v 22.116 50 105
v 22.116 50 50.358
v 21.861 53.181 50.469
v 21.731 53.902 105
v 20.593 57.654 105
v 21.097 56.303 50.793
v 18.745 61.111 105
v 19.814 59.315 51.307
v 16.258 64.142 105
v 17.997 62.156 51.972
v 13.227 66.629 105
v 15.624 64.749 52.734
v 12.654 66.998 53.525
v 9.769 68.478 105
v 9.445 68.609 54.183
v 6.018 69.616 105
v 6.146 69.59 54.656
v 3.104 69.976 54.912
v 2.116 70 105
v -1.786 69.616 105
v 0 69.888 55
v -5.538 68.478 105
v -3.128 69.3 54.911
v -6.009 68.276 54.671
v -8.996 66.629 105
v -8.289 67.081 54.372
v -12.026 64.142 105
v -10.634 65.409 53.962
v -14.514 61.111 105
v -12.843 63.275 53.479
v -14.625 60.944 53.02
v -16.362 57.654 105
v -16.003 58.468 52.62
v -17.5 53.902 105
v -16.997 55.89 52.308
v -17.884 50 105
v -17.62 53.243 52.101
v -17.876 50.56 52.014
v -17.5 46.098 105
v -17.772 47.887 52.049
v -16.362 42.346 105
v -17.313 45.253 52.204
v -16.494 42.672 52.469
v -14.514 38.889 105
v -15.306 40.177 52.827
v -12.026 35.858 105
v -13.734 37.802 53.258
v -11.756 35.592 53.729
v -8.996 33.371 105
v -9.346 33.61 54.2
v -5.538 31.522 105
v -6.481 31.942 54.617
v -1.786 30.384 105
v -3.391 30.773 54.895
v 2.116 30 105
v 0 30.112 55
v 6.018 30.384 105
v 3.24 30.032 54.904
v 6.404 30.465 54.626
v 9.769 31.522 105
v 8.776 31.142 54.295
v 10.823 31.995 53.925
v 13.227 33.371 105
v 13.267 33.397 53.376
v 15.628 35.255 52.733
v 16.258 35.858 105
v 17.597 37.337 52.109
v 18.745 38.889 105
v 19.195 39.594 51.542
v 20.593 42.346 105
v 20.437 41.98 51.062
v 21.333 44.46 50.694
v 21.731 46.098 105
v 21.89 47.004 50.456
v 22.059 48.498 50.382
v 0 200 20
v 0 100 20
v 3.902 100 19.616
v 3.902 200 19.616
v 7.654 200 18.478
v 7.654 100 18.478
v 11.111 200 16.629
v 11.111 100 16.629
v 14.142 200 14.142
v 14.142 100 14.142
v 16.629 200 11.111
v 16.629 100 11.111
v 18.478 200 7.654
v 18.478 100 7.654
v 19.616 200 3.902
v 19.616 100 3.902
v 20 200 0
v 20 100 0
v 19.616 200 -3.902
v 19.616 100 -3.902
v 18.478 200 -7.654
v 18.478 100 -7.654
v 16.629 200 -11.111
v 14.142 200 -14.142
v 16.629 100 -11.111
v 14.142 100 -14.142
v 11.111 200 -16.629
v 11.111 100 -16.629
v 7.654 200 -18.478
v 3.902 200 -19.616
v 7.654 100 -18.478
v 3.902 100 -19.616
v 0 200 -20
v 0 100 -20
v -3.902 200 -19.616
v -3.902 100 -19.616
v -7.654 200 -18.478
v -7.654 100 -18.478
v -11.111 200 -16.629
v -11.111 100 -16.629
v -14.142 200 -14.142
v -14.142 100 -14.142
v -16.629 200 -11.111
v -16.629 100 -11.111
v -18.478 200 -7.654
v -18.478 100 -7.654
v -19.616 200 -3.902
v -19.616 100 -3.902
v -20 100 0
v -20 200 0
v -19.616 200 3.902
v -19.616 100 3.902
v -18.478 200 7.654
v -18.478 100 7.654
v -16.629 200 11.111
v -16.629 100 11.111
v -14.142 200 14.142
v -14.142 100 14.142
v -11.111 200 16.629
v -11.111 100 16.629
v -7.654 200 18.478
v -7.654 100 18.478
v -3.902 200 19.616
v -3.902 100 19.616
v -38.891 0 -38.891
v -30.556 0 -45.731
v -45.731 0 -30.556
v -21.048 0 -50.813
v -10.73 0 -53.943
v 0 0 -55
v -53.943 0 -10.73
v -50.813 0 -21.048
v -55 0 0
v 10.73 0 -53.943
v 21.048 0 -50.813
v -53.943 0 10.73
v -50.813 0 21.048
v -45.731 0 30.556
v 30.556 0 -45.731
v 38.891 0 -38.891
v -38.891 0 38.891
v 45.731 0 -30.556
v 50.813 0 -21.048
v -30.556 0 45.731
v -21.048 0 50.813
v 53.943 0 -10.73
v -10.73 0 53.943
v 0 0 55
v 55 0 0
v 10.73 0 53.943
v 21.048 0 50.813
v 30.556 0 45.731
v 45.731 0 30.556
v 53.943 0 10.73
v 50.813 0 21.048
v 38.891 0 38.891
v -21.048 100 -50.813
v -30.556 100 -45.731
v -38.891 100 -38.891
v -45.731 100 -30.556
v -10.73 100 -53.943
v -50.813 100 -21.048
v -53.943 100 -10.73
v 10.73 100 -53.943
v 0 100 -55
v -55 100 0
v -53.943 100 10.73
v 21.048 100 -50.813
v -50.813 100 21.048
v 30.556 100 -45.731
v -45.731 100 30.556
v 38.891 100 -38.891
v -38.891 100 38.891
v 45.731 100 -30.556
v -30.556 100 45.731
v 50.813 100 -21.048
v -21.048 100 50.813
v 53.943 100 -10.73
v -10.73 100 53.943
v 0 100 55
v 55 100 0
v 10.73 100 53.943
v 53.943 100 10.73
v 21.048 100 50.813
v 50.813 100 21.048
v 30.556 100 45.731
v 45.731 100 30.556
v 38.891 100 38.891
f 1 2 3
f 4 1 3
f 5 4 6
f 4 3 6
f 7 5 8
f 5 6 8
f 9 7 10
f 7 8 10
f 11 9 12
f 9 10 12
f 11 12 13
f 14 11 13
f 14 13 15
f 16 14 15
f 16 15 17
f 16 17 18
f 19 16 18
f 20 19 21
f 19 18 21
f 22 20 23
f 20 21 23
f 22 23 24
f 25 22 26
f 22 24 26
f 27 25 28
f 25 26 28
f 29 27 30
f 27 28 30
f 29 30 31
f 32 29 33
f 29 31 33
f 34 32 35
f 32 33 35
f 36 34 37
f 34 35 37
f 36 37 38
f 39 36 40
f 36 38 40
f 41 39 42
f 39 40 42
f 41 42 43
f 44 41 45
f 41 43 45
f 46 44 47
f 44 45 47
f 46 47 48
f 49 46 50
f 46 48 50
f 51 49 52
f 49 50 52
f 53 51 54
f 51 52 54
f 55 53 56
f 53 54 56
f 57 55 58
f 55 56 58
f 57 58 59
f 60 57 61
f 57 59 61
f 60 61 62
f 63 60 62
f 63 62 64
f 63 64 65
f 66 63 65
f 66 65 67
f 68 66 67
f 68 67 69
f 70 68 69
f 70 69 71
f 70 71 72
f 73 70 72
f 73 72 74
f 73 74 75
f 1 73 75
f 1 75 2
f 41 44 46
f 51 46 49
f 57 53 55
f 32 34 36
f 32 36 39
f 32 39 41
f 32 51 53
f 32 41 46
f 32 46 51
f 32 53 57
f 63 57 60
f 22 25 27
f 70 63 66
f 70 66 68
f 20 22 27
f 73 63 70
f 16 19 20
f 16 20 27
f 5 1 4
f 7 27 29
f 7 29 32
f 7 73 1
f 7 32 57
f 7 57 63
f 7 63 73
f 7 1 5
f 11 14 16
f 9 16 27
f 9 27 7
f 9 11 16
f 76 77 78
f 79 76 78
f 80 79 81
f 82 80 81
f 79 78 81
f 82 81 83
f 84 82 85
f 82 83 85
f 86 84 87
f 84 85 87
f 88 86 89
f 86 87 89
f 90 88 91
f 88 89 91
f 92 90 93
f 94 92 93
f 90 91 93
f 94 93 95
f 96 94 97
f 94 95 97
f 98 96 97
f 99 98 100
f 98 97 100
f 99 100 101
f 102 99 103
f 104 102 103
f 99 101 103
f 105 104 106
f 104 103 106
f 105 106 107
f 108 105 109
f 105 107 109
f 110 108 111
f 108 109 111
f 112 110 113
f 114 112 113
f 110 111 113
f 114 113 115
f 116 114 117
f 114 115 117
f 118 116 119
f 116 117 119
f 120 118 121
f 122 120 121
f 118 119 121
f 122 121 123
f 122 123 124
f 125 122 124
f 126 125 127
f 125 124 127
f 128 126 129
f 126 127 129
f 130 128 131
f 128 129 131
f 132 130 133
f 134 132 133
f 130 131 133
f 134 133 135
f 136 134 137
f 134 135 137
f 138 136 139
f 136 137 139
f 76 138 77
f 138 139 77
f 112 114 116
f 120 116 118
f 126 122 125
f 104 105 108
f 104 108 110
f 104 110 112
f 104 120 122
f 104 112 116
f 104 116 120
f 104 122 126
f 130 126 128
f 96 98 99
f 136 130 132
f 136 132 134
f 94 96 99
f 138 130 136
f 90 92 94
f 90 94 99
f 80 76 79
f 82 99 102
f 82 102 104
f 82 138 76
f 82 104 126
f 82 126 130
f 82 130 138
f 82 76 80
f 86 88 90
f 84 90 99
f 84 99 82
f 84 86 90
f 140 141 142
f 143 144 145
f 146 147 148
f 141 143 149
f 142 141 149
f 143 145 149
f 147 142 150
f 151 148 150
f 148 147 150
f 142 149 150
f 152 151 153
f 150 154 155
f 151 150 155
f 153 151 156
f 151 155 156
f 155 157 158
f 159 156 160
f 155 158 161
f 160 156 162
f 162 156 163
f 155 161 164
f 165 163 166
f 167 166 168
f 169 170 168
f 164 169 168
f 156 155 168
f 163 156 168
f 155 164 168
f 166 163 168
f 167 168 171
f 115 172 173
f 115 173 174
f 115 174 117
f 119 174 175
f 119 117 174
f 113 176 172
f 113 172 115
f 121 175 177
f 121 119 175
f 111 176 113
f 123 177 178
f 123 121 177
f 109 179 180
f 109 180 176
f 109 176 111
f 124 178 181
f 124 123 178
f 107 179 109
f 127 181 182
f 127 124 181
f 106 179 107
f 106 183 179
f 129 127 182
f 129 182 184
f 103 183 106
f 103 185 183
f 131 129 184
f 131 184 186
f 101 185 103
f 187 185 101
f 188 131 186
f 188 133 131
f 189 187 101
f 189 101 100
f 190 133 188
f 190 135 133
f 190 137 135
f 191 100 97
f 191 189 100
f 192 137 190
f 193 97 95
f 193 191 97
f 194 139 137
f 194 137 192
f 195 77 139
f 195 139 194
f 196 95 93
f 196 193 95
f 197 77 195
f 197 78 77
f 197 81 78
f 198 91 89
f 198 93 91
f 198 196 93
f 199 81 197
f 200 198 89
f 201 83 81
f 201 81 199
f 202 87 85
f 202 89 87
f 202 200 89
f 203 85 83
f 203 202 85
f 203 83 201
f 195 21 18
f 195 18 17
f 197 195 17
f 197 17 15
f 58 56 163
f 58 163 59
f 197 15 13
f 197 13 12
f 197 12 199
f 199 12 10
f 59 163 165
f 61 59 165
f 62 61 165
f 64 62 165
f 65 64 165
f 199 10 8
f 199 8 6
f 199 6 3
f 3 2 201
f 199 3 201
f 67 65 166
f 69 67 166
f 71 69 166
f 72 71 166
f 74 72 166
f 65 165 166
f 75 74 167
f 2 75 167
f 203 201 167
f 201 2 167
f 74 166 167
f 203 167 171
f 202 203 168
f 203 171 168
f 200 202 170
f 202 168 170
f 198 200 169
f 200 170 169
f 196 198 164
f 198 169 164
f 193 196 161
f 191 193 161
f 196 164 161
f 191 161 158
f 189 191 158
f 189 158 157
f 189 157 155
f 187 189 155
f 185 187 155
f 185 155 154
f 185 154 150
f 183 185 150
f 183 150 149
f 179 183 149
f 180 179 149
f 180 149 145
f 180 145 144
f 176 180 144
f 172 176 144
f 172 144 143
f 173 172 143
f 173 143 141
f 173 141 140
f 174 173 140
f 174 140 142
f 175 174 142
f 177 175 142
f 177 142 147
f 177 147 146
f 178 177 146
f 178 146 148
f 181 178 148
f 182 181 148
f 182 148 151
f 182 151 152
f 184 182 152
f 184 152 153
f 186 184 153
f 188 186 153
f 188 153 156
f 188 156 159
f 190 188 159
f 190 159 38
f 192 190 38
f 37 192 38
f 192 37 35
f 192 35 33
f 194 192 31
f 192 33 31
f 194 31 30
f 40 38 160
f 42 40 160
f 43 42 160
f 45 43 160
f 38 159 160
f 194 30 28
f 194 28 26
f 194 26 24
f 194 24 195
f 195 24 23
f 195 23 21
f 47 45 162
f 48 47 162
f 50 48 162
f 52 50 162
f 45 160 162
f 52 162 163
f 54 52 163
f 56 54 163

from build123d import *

# Parameters (mm, degrees)
SKETCH1_R                = 55
BOSS_EXTRUDE1_DEPTH      = 100
SKETCH2_R                = 20
BOSS_EXTRUDE2_DEPTH      = 100
BOSS_EXTRUDE3_DEPTH      = 50
BOSS_EXTRUDE3_DEPTH_BACK = 20
SKETCH3_R                = 20


with BuildPart() as part:
    # Sketch1 → Boss-Extrude1 (new body)
    with BuildSketch(Plane(origin=(0, 0, 0), x_dir=(1, 0, 0), z_dir=(0, 1, 0))):
        with Locations(Location((0, 0, 0), (0, 0, 270))):
            Circle(SKETCH1_R)
    extrude(amount=BOSS_EXTRUDE1_DEPTH)

    # Sketch2 → Boss-Extrude2 (add)
    with BuildSketch(Plane(origin=(0, 100, 0), x_dir=(1, 0, 0), z_dir=(0, 1, 0))):
        with Locations(Location((0, 0, 0), (0, 0, 270))):
            Circle(SKETCH2_R)
    extrude(amount=BOSS_EXTRUDE2_DEPTH)

    # Sketch3 → Boss-Extrude3 (add, two sides: drawn at the far end of the back side and taken through both)
    with BuildSketch(Plane.XY.offset(55).offset(-BOSS_EXTRUDE3_DEPTH_BACK)):
        with Locations((2.115721614, 50)):
            Circle(SKETCH3_R)
    extrude(amount=BOSS_EXTRUDE3_DEPTH + BOSS_EXTRUDE3_DEPTH_BACK)


solid = part.part
